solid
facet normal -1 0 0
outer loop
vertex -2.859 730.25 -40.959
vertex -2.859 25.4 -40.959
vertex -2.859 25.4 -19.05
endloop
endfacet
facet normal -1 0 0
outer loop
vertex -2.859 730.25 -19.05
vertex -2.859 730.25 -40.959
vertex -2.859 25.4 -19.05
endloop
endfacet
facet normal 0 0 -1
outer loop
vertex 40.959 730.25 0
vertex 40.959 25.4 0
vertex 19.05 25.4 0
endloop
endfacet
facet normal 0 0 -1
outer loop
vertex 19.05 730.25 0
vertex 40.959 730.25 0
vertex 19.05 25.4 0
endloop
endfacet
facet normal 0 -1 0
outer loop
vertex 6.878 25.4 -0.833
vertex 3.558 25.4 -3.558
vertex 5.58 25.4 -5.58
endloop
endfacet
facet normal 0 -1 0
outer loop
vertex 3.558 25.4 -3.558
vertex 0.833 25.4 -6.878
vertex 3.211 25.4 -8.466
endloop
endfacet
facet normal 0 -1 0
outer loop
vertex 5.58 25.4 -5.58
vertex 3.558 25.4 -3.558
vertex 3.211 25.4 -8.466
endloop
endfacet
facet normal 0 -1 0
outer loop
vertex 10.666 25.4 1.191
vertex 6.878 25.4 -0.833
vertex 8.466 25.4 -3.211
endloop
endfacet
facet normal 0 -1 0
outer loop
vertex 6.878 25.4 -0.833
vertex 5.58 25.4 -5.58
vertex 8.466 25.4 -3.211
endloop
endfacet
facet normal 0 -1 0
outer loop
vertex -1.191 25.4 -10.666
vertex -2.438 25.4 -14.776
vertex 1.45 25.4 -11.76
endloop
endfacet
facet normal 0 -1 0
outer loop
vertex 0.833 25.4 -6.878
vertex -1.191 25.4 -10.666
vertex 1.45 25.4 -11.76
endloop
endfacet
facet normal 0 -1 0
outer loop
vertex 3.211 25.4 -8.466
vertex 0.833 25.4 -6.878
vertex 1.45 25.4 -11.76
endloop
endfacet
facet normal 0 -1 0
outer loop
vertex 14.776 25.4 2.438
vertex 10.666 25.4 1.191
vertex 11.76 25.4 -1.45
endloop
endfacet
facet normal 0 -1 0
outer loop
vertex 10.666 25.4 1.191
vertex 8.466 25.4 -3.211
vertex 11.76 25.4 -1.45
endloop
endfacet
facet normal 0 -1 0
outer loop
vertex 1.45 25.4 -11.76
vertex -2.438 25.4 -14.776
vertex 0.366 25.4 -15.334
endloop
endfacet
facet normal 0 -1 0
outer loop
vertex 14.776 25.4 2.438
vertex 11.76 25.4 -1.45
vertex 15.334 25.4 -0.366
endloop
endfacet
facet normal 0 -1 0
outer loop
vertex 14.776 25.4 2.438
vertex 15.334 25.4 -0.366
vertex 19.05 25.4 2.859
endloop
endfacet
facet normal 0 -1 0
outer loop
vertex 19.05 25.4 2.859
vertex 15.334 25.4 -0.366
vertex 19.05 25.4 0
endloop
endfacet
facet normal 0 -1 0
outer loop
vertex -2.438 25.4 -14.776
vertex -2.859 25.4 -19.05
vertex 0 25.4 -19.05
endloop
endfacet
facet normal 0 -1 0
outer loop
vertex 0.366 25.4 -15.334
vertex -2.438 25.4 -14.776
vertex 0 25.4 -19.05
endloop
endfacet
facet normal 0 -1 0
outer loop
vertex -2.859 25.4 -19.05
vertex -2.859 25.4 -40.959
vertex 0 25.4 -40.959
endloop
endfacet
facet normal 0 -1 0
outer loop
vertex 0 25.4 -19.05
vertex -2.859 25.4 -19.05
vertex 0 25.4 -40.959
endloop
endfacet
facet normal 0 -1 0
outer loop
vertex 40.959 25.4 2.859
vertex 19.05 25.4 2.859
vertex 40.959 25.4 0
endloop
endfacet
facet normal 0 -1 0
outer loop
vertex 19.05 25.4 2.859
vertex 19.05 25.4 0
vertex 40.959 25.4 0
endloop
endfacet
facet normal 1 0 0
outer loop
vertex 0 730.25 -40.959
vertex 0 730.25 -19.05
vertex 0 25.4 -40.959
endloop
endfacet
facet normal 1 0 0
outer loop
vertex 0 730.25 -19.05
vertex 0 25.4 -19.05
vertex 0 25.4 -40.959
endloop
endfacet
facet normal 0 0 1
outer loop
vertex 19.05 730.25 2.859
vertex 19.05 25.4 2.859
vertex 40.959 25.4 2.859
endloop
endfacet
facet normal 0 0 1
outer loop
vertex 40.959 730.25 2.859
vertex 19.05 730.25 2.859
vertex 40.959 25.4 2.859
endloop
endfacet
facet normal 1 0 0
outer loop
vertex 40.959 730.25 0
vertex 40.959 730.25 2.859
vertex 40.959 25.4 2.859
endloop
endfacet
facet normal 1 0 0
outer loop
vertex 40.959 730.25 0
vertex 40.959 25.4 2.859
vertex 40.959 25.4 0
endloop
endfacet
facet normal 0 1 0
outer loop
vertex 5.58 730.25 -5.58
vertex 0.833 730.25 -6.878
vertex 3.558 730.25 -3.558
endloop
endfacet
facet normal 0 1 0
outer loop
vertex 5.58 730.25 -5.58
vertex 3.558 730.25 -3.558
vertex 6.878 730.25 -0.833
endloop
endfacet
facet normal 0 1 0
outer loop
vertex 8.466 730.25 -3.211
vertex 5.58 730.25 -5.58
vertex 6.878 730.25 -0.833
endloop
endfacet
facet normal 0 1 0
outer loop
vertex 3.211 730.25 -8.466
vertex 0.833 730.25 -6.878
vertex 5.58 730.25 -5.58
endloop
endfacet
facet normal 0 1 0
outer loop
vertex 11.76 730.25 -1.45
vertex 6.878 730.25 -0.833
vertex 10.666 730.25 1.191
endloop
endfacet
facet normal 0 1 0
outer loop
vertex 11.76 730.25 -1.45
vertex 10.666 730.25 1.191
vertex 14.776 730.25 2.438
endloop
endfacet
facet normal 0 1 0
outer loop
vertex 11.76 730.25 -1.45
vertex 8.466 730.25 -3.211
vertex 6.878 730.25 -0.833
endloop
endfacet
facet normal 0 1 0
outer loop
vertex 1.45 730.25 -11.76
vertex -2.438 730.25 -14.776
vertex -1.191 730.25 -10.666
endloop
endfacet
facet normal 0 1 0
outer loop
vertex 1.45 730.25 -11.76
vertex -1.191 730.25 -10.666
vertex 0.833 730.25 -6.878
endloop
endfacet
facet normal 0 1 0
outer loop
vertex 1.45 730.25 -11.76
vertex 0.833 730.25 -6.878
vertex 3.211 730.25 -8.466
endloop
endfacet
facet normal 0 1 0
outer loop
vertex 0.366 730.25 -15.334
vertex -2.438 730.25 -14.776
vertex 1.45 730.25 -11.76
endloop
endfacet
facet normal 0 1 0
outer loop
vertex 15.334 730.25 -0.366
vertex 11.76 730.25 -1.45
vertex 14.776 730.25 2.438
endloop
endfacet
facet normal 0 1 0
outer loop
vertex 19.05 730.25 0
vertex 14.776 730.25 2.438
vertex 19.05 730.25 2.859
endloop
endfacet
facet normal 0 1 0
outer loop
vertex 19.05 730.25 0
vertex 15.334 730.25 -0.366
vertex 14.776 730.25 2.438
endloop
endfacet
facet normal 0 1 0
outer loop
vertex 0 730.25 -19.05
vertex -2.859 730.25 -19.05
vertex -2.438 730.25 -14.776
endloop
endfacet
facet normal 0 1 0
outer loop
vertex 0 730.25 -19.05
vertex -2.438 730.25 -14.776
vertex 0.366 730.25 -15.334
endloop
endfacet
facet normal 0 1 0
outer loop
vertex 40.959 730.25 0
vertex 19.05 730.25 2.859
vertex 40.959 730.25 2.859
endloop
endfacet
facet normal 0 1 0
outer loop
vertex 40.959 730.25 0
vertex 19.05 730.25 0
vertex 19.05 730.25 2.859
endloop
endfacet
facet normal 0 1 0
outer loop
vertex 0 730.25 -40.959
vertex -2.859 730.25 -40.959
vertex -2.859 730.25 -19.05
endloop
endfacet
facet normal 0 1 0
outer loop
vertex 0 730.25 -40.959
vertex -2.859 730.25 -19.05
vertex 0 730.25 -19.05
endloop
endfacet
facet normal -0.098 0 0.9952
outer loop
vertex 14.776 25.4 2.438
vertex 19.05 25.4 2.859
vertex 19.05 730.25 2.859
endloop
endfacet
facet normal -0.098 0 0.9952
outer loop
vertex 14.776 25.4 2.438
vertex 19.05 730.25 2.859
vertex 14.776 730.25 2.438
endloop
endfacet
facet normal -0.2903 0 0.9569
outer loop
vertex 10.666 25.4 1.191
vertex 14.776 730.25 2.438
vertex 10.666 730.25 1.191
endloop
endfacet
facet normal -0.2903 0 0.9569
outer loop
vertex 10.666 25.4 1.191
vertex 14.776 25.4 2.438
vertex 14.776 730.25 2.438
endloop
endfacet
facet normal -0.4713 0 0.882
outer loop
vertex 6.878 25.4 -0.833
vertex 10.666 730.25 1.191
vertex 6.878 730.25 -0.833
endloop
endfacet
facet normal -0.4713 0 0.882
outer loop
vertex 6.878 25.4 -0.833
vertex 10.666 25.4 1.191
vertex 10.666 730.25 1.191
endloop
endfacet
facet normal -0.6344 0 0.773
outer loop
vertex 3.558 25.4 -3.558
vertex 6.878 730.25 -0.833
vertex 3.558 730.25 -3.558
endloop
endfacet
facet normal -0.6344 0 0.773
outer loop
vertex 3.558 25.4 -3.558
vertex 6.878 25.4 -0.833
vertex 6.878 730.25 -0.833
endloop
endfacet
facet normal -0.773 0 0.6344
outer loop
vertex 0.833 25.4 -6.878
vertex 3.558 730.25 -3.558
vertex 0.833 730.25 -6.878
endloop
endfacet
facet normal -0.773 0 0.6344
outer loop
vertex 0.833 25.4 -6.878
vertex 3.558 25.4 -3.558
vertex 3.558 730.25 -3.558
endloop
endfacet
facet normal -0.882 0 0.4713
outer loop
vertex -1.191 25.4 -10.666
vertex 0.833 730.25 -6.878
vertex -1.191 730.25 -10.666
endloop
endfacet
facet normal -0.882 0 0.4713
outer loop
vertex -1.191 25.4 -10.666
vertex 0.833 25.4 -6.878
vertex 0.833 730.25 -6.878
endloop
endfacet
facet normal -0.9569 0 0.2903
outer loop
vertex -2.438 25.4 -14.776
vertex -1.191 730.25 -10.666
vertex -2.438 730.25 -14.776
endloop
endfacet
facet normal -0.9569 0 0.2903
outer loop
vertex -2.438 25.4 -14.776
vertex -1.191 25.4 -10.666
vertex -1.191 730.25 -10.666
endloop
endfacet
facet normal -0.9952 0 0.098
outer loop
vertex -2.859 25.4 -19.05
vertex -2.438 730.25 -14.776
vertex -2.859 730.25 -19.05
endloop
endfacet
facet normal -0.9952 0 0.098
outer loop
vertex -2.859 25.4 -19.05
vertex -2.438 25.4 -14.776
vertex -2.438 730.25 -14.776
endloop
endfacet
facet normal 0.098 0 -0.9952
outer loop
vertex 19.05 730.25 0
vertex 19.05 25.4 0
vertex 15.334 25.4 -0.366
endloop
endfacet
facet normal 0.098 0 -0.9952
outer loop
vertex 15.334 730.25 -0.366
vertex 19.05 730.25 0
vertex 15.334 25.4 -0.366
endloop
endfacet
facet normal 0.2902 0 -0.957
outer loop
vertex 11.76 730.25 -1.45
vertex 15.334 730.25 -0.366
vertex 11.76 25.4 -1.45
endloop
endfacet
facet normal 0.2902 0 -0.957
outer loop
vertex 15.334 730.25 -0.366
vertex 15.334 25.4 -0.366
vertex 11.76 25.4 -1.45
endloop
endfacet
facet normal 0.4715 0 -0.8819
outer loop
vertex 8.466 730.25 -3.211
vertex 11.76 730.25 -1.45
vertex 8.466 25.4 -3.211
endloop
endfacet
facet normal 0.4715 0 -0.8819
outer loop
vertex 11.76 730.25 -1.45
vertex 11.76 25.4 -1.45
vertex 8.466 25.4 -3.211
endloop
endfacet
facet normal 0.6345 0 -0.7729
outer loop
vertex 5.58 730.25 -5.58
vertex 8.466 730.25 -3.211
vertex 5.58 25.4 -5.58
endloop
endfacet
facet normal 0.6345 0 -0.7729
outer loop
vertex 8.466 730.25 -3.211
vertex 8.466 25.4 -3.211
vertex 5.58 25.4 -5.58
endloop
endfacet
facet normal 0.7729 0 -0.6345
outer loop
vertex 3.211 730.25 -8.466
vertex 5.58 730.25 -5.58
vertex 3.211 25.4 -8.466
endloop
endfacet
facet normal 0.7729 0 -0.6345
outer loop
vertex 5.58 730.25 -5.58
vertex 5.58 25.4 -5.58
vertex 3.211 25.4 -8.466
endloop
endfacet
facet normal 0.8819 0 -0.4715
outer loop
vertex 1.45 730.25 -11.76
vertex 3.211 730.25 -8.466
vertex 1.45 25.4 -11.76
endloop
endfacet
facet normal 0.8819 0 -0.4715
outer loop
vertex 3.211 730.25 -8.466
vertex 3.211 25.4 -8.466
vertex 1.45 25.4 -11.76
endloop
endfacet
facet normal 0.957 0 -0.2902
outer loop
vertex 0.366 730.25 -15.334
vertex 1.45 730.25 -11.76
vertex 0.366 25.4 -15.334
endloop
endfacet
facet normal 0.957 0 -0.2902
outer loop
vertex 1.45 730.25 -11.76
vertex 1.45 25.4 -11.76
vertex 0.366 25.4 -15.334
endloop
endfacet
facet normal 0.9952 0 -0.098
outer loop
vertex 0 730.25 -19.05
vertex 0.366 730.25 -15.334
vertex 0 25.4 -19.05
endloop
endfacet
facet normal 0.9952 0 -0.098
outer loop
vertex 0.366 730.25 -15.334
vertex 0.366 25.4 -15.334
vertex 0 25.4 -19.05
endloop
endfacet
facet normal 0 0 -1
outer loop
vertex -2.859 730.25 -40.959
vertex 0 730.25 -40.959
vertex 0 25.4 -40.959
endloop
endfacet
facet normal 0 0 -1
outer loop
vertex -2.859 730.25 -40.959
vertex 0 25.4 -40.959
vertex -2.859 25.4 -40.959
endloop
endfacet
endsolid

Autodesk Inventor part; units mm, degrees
ref_plane "YZ Plane" through (0, 0, 0) normal (1, 0, 0) x (0, 1, 0)
ref_plane "XZ Plane" through (0, 0, 0) normal (0, 1, 0) x (-1, 0, 0)
ref_plane "XY Plane" through (0, 0, 0) normal (0, 0, 1) x (1, 0, 0)
sketch "Sketch1" plane through (0, 0, 0) normal (0, 1, 0) x (-1, 0, 0)
  line L0 (0, 0) -> (-38.1, 0)
  line L1 (-38.1, 0) -> (-38.1, -38.1)
  line L2 (-38.1, -38.1) -> (0, -38.1)
  line L3 (0, -38.1) -> (0, 0)
  dimension "d0" = 38.1
  dimension "d1" = 38.1
extrude "Extrusion1" add sketch "Sketch1" along normal blind 25.4
fillet "Fillet1" radius 19.05 1 edges at (0, 12.7, 0)
sketch "Sketch2" plane through (0, 25.4, 0) normal (0, 1, 0) x (1, 0, 0)
  arc A0 (0, 19.05) -> (19.05, 0) centre (19.05, 19.05) ccw projected
  line L0 (0, 38.1) -> (0, 19.05) projected
  line L1 (38.1, 38.1) -> (0, 38.1) projected
  line L2 (38.1, 0) -> (38.1, 38.1) projected
  line L3 (19.05, 0) -> (38.1, 0) projected
  arc A1 (-2.8591, 19.05) -> (19.05, -2.8591) centre (19.05, 19.05) ccw
  line L4 (-2.8591, 19.05) -> (-2.8591, 40.9591)
  line L5 (-2.8591, 40.9591) -> (40.9591, 40.9591)
  line L6 (40.9591, 40.9591) -> (40.9591, -2.8591)
  line L7 (40.9591, -2.8591) -> (19.05, -2.8591)
  line L8 (0, 38.1) -> (0, 40.9591)
  line L9 (38.1, 0) -> (40.9591, 0)
  point P0 (0, 0)
extrude "Extrusion2" add sketch "Sketch2" along normal blind 44.45 contours A0 L3 L9 L6 L7 A1 L4 L5 L8 L0
sketch "Sketch3" plane through (0, 25.4, 0) normal (0, 1, 0) x (1, 0, 0)
  arc A0 (0, 19.05) -> (19.05, 0) centre (19.05, 19.05) ccw projected
  line L0 (19.05, 0) -> (38.1, 0) projected
  line L1 (38.1, 0) -> (38.1, 38.1) projected
  line L2 (38.1, 38.1) -> (0, 38.1) projected
  line L3 (0, 38.1) -> (0, 19.05) projected
  point P0 (0, 0)
extrude "Extrusion3" cut sketch "Sketch3" against normal blind 44.45
sketch "Sketch4" plane through (0, 69.85, 0) normal (0, 1, 0) x (1, 0, 0)
  arc A0 (0, 19.05) -> (19.05, 0) centre (19.05, 19.05) ccw projected
  line L0 (0, 19.05) -> (0, 40.9591) projected
  line L1 (0, 40.9591) -> (-2.8591, 40.9591) projected
  line L2 (-2.8591, 40.9591) -> (-2.8591, 19.05) projected
  arc A1 (-2.8591, 19.05) -> (19.05, -2.8591) centre (19.05, 19.05) ccw projected
  line L3 (19.05, -2.8591) -> (40.9591, -2.8591) projected
  line L4 (40.9591, -2.8591) -> (40.9591, 0) projected
  line L5 (40.9591, 0) -> (19.05, 0) projected
  point P0 (0, 0)
extrude "Extrusion4" add sketch "Sketch4" along normal blind 660.4
properties part number "Cart_Side_Beam"
